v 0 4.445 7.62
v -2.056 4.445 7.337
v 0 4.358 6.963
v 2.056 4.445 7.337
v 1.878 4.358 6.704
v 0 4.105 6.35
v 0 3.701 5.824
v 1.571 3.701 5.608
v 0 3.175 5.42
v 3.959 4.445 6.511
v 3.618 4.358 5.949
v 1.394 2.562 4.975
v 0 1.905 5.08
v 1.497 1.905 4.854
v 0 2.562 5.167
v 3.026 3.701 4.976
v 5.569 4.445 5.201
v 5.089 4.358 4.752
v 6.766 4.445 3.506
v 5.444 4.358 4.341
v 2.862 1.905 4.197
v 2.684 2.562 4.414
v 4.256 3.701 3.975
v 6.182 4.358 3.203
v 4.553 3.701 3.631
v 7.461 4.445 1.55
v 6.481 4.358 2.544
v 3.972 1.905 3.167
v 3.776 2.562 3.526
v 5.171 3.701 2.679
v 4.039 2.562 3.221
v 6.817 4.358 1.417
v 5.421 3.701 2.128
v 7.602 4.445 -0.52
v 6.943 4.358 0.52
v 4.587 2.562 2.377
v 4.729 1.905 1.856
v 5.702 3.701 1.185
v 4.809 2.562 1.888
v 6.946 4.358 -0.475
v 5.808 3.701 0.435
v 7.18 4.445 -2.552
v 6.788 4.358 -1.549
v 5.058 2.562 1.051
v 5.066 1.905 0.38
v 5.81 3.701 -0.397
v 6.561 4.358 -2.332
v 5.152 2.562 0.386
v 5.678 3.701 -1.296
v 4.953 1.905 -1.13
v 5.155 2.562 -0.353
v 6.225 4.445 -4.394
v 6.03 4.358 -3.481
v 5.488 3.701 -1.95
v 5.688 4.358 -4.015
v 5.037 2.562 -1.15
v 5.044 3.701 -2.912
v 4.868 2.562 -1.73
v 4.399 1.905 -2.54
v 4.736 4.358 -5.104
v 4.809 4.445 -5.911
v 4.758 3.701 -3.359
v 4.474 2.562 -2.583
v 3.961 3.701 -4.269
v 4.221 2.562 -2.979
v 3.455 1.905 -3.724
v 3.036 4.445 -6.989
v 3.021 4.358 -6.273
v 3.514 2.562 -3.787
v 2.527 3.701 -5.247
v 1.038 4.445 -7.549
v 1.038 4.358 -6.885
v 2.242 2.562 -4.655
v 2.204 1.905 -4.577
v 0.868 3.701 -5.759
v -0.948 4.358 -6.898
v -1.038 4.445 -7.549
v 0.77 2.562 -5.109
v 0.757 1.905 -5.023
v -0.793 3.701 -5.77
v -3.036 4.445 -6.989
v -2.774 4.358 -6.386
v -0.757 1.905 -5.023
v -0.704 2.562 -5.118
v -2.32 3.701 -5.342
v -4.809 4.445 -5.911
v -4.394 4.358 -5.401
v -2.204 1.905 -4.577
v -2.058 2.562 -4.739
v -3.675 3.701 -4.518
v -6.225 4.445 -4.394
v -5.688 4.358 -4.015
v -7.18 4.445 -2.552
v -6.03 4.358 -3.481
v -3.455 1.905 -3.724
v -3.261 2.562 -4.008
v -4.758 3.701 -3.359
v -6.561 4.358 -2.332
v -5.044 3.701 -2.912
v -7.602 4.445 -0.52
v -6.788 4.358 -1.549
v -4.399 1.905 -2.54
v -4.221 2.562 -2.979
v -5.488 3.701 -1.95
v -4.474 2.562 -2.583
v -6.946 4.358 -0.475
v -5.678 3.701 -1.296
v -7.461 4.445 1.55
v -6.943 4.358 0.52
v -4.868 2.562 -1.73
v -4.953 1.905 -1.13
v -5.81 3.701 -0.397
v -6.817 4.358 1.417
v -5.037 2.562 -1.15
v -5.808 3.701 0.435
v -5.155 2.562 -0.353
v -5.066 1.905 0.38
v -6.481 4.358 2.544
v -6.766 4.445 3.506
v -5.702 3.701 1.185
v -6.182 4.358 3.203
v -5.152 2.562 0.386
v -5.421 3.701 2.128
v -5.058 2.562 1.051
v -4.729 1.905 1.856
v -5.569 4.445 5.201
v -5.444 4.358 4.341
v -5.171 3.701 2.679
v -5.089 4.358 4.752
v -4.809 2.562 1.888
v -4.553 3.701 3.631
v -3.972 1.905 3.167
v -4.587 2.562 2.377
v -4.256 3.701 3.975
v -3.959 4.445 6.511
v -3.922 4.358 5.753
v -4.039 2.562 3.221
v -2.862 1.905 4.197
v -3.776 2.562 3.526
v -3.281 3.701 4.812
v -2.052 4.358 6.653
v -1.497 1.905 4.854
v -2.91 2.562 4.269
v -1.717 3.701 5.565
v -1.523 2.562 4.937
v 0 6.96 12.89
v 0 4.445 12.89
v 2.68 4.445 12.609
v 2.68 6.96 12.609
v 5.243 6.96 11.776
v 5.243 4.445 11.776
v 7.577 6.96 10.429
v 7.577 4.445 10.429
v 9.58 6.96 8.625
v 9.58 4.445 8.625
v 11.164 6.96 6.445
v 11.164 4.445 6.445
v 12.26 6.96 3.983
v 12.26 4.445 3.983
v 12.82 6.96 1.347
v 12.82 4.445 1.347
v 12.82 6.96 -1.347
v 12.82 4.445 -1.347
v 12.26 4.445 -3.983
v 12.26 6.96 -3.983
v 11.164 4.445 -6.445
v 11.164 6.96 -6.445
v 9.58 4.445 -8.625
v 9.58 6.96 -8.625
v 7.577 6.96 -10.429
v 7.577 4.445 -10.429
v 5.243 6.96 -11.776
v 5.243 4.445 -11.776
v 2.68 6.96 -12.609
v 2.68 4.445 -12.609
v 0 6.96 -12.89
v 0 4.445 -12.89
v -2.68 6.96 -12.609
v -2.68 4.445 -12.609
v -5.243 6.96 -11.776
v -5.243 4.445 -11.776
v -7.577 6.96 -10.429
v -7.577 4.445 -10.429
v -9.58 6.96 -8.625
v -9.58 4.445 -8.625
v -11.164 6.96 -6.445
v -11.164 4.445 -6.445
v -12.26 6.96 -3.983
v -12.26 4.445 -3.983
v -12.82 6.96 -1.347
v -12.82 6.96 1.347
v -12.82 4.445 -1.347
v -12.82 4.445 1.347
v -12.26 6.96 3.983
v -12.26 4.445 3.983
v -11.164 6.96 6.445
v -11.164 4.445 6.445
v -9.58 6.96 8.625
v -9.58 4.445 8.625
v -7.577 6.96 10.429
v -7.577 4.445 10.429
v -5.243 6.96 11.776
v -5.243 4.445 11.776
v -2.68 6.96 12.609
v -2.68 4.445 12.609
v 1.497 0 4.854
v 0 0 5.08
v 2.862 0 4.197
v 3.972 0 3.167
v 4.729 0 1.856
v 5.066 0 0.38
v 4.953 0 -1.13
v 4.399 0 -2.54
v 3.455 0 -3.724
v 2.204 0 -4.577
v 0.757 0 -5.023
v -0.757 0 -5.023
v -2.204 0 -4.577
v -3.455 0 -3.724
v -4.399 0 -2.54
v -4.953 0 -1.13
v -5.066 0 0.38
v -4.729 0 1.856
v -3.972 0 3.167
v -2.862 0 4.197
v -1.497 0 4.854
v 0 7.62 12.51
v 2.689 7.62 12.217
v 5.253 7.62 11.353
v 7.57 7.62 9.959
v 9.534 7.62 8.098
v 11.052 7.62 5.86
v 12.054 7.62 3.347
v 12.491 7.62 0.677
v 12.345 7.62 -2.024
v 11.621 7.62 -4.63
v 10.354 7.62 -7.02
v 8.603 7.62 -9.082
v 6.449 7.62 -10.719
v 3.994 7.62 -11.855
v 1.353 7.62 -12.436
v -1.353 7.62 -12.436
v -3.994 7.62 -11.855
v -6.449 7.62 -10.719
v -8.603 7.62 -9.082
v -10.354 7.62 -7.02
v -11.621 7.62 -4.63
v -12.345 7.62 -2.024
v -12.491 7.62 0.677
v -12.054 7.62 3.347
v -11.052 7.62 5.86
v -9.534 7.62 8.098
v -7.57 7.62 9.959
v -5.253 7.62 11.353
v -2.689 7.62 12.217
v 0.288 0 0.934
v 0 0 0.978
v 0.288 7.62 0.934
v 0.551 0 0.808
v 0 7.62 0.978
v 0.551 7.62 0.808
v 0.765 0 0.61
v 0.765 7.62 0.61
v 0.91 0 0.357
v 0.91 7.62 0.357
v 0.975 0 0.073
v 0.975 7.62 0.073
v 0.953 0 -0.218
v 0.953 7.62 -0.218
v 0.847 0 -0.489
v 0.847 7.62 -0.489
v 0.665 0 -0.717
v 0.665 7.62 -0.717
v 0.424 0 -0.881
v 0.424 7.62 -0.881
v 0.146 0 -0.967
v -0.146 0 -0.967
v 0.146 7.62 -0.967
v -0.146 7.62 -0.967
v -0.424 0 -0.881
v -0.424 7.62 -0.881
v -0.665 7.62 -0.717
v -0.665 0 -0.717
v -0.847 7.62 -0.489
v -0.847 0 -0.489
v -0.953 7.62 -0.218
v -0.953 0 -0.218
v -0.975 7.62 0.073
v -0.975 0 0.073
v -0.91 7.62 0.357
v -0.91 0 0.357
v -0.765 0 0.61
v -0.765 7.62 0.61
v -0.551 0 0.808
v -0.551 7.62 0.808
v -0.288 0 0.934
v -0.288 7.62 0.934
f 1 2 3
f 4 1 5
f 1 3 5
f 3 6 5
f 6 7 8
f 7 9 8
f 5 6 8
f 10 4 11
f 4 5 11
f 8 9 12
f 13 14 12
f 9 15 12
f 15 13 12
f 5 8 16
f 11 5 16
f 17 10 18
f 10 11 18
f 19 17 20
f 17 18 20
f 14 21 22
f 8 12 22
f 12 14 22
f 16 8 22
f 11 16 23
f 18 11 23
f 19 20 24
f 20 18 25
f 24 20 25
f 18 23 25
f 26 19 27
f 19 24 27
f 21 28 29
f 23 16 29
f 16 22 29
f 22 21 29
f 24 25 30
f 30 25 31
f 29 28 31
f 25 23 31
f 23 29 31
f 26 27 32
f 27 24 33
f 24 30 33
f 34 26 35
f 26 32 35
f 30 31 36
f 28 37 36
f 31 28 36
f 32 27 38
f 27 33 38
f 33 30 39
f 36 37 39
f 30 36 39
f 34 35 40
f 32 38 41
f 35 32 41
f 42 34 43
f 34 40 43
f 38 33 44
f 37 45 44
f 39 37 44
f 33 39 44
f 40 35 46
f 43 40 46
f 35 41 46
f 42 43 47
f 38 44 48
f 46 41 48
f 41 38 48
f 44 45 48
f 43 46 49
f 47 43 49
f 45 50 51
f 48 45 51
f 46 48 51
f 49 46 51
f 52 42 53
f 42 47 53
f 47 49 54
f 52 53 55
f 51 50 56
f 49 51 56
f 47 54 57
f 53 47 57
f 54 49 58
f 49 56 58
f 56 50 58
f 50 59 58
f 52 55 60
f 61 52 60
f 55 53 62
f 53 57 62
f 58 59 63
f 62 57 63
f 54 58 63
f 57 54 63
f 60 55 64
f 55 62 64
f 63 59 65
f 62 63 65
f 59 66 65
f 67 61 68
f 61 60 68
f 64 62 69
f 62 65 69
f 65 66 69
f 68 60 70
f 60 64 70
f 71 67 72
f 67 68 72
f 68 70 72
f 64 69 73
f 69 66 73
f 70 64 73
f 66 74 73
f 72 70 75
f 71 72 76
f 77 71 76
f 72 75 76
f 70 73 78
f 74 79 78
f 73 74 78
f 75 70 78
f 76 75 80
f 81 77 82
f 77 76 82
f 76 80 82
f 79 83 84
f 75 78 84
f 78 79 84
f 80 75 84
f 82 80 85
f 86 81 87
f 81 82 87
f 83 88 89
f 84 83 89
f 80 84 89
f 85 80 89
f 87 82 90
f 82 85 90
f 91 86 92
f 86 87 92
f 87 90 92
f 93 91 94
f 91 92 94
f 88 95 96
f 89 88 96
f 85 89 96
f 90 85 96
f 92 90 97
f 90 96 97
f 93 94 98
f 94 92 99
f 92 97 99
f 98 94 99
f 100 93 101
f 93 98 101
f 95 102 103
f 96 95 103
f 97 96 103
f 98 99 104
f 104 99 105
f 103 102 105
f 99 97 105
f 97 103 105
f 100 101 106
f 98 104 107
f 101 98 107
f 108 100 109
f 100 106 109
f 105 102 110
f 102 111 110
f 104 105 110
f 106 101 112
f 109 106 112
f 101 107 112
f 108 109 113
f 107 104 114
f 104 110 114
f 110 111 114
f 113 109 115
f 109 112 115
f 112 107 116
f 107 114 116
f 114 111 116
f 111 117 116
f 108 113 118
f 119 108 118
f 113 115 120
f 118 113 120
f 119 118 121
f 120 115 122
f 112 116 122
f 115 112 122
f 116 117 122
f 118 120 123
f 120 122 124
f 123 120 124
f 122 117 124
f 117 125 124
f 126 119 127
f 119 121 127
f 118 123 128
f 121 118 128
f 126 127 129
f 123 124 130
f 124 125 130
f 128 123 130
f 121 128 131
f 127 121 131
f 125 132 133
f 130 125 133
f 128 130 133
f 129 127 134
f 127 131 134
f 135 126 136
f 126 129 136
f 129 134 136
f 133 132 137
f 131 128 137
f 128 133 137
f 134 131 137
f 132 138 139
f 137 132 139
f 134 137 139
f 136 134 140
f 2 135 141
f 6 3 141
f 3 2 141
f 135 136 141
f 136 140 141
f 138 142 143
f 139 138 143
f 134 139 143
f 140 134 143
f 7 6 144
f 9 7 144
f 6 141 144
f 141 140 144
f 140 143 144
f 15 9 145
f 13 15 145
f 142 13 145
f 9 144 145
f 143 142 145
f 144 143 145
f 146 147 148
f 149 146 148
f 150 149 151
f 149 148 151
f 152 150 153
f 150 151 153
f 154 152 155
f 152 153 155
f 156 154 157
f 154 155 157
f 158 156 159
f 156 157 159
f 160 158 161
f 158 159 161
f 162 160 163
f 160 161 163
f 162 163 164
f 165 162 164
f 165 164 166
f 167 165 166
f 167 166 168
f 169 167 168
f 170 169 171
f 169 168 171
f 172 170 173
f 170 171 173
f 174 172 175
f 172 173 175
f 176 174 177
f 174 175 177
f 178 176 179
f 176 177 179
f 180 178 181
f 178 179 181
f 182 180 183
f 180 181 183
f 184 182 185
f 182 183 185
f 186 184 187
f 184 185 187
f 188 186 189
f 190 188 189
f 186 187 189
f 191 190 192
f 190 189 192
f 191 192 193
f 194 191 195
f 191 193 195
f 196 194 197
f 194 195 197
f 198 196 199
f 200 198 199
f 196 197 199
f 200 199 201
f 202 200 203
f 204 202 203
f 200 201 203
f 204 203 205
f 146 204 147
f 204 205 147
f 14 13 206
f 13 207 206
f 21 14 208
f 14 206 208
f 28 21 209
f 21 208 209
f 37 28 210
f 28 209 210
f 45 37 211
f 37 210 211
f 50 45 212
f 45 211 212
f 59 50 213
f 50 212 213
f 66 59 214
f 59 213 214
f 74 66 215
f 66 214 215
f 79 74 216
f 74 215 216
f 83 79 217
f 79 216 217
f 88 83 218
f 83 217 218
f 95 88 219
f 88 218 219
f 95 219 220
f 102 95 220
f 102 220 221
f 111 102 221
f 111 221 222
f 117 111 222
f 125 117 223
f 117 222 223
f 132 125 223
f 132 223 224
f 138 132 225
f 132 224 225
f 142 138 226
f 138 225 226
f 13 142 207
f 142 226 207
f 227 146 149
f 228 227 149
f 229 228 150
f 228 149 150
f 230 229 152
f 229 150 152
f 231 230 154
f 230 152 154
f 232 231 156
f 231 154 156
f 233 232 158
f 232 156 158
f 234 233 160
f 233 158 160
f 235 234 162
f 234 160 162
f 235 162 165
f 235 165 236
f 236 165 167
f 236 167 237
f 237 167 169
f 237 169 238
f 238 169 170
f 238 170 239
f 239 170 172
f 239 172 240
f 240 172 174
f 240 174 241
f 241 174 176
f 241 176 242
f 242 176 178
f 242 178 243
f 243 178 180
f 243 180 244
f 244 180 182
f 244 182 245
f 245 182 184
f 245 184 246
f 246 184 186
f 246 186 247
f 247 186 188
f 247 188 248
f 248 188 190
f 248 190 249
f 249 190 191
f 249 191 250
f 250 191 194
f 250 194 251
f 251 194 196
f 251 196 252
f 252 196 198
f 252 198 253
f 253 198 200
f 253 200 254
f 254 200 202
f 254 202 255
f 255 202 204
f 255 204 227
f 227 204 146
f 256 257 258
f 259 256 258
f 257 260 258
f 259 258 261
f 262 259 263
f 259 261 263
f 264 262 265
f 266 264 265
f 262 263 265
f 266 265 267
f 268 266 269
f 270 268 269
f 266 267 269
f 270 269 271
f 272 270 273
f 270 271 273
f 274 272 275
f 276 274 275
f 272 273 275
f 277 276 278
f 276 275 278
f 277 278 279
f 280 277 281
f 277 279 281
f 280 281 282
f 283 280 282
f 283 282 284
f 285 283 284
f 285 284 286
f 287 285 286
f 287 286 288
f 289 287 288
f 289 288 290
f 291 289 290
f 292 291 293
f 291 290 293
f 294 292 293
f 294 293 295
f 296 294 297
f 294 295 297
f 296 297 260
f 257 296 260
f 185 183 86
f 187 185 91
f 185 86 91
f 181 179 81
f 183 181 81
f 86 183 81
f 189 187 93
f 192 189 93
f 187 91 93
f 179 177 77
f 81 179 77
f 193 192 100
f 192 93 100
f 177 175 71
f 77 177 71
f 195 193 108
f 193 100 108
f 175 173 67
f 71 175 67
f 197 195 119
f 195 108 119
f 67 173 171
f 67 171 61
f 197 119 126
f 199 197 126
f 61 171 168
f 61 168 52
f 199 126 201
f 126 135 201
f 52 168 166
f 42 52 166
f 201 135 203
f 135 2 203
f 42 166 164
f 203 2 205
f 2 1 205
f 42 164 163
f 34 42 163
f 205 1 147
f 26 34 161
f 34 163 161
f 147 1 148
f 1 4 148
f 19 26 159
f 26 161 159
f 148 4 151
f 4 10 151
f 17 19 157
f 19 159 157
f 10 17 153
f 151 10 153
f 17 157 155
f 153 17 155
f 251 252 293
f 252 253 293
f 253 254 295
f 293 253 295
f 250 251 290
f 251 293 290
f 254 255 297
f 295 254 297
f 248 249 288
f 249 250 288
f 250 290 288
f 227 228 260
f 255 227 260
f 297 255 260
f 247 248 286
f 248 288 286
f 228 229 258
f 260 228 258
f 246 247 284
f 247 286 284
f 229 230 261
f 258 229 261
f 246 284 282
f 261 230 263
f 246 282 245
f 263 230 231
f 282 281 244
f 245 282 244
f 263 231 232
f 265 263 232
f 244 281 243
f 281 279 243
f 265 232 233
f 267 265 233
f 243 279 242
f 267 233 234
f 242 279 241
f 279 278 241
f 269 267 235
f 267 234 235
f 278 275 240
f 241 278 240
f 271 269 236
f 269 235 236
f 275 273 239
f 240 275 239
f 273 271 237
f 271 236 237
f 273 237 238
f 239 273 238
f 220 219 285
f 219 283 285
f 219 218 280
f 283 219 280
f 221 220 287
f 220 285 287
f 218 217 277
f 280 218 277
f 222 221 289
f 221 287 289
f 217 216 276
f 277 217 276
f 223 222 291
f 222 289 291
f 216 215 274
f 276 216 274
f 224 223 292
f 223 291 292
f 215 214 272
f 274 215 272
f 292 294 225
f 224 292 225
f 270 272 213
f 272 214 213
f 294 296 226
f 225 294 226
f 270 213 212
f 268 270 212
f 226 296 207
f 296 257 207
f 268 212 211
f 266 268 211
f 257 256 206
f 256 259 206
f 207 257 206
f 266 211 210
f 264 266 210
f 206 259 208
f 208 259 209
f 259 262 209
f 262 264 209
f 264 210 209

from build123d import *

# Parameters (mm, degrees)
CHAMFER1_SIZE  = 0.381
CHAMFER1_SIZE2 = 0.659911358


with BuildPart() as part:
    # Sketch1 → Revolve1 (revolve)
    with BuildSketch(Plane(origin=(0, 0, 0), x_dir=(0, 0, -1), z_dir=(1, 0, 0))):
        with BuildLine():
            Line((-0.9779, 0), (-0.9779, 7.62))
            Line((-0.9779, 7.62), (-12.8905, 7.62))
            Line((-12.8905, 7.62), (-12.8905, 4.445))
            Line((-12.8905, 4.445), (-7.62, 4.445))
            ThreePointArc((-7.62, 4.445), (-5.823948776, 3.701051224), (-5.08, 1.905))
            Line((-5.08, 1.905), (-5.08, 0))
            Line((-5.08, 0), (-0.9779, 0))
        make_face()
    revolve(axis=Axis((0, 0, 0), (0, 1, 0)))

    # Chamfer1
    chamfer1_edges = [part.edges().sort_by_distance(p)[0] for p in [
        (0, 7.62, -12.8905),
    ]]
    chamfer1_side = [part.faces().sort_by_distance(p)[0] for p in [
        (0, 7.62, -1.342498399),
    ]]
    chamfer(chamfer1_edges, length=CHAMFER1_SIZE, length2=CHAMFER1_SIZE2, reference=chamfer1_side[0])


solid = part.part
